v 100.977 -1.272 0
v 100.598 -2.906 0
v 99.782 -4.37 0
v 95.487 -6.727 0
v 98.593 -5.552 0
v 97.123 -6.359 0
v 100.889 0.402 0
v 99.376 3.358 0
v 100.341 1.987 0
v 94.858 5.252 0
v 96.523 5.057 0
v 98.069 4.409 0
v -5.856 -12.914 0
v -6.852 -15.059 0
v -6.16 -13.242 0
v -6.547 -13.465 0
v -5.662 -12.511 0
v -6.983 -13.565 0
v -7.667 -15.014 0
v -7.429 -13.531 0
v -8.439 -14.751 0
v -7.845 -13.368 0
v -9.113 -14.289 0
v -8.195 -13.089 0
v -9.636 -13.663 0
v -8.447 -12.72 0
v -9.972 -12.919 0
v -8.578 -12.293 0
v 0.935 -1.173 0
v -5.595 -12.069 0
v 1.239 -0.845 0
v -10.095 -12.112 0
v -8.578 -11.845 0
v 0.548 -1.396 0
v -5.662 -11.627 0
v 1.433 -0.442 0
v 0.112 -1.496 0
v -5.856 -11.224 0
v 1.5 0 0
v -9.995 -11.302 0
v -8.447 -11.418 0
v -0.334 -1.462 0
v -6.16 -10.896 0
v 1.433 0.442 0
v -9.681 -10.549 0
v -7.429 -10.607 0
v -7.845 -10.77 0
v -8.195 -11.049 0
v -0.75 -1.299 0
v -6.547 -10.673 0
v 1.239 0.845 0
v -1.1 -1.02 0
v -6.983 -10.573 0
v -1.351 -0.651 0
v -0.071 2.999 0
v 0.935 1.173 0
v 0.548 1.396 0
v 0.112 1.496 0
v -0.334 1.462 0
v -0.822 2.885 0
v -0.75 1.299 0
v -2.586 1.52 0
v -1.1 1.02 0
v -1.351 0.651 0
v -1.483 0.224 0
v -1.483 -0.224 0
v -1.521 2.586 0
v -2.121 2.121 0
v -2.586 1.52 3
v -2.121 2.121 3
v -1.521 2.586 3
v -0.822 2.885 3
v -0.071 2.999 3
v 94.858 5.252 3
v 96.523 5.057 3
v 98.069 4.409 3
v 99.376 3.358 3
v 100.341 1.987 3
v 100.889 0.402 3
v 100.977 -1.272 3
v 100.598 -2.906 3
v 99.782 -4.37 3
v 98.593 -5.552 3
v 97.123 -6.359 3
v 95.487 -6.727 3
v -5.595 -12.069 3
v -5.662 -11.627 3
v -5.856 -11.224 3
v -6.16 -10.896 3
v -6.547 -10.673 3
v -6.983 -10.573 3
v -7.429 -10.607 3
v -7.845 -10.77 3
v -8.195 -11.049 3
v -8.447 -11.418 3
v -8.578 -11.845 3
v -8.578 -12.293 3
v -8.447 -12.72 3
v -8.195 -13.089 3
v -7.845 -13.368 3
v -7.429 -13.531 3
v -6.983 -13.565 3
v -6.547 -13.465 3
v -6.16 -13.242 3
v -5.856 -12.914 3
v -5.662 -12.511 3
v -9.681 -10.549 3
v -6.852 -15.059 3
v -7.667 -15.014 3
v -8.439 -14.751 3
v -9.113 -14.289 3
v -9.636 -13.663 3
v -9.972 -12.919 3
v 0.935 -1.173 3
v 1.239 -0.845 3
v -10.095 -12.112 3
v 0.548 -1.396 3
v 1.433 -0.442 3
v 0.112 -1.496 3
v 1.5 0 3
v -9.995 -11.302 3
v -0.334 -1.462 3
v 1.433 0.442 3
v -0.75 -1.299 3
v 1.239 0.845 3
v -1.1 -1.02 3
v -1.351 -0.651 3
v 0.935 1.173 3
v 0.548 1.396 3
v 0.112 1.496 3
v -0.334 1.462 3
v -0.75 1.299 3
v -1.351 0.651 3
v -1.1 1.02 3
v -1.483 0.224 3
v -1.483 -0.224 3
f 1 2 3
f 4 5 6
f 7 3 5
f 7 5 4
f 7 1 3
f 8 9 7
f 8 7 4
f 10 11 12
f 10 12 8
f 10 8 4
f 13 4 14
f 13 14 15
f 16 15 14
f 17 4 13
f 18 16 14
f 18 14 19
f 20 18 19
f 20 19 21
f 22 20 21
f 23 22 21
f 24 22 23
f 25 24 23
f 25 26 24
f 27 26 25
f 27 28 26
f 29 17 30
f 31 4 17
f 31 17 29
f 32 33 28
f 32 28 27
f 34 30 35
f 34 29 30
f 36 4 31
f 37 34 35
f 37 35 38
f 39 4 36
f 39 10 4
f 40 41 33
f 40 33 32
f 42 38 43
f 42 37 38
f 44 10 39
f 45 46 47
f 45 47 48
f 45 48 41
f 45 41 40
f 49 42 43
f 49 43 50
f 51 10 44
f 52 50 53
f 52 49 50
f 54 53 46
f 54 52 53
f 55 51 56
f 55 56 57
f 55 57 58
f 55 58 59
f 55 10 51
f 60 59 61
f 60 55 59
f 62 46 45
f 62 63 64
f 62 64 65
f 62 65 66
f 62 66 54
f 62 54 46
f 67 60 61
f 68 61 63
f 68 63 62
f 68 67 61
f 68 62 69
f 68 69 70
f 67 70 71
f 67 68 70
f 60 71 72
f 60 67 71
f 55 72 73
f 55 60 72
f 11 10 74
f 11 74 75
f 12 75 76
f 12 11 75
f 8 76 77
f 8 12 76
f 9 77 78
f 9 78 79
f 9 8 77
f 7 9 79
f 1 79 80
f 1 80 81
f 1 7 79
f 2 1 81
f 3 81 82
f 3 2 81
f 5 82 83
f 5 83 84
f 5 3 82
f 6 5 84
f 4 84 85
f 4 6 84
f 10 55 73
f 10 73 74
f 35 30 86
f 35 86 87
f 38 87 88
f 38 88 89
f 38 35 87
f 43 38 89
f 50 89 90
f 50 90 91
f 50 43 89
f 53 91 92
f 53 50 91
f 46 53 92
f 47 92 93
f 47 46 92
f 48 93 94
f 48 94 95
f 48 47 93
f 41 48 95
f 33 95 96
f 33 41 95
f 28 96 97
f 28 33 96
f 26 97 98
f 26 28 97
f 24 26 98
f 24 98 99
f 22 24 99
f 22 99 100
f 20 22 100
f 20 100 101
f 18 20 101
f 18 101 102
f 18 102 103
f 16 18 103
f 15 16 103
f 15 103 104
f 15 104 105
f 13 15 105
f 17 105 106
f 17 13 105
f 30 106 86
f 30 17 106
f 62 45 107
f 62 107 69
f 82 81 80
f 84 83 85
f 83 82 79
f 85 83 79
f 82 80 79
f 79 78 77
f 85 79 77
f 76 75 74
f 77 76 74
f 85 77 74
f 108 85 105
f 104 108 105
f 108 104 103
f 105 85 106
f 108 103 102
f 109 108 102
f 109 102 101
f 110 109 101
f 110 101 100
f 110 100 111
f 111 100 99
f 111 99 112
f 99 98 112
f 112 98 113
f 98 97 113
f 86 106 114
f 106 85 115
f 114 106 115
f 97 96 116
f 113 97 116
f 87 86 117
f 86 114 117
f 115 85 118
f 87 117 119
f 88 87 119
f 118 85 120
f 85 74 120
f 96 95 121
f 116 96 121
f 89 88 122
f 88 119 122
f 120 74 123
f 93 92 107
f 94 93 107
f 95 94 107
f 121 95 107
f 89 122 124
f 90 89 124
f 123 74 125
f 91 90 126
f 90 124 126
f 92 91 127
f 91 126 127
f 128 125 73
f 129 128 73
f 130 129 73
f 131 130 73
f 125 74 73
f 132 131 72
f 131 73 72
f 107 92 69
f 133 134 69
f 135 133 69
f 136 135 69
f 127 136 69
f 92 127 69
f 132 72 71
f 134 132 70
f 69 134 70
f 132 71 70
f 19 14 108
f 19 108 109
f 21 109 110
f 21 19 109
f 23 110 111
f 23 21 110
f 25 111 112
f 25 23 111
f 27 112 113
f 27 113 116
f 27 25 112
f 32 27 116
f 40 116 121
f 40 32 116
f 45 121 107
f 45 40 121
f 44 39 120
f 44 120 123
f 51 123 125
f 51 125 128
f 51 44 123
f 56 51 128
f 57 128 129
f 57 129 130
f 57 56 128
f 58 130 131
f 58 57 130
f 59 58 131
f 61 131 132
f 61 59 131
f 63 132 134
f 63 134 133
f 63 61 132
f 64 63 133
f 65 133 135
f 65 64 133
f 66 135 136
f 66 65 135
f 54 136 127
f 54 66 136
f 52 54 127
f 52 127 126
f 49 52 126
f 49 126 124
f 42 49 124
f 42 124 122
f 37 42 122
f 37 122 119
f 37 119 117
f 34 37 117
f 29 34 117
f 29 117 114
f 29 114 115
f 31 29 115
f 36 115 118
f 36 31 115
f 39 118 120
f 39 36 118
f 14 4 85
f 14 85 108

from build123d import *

# Parameters (mm, degrees)
SKETCH3_R           = 1.5
BOSS_EXTRUDE1_DEPTH = 3


with BuildPart() as part:
    # Sketch3 → Boss-Extrude1 (new body)
    with BuildSketch(Plane.XY):
        with BuildLine():
            Line((-9.681295011, -10.548579379), (-2.586204824, 1.520376469))
            ThreePointArc((-2.586204824, 1.520376469), (-1.520557397, 2.586098452), (-0.071160516, 2.999155911))
            Line((-0.071160516, 2.999155911), (94.857678968, 5.25151804))
            ThreePointArc((94.857678968, 5.25151804), (100.991739474, -0.432058845), (95.486888577, -6.727006113))
            Line((95.486888577, -6.727006113), (-6.851645898, -15.059062012))
            ThreePointArc((-6.851645898, -15.059062012), (-9.636397947, -13.663244049), (-9.681295011, -10.548579379))
        make_face()
        with Locations((-7.095090187, -12.068955847)):
            Circle(SKETCH3_R, mode=Mode.SUBTRACT)
        Circle(SKETCH3_R, mode=Mode.SUBTRACT)
    extrude(amount=BOSS_EXTRUDE1_DEPTH)


solid = part.part
